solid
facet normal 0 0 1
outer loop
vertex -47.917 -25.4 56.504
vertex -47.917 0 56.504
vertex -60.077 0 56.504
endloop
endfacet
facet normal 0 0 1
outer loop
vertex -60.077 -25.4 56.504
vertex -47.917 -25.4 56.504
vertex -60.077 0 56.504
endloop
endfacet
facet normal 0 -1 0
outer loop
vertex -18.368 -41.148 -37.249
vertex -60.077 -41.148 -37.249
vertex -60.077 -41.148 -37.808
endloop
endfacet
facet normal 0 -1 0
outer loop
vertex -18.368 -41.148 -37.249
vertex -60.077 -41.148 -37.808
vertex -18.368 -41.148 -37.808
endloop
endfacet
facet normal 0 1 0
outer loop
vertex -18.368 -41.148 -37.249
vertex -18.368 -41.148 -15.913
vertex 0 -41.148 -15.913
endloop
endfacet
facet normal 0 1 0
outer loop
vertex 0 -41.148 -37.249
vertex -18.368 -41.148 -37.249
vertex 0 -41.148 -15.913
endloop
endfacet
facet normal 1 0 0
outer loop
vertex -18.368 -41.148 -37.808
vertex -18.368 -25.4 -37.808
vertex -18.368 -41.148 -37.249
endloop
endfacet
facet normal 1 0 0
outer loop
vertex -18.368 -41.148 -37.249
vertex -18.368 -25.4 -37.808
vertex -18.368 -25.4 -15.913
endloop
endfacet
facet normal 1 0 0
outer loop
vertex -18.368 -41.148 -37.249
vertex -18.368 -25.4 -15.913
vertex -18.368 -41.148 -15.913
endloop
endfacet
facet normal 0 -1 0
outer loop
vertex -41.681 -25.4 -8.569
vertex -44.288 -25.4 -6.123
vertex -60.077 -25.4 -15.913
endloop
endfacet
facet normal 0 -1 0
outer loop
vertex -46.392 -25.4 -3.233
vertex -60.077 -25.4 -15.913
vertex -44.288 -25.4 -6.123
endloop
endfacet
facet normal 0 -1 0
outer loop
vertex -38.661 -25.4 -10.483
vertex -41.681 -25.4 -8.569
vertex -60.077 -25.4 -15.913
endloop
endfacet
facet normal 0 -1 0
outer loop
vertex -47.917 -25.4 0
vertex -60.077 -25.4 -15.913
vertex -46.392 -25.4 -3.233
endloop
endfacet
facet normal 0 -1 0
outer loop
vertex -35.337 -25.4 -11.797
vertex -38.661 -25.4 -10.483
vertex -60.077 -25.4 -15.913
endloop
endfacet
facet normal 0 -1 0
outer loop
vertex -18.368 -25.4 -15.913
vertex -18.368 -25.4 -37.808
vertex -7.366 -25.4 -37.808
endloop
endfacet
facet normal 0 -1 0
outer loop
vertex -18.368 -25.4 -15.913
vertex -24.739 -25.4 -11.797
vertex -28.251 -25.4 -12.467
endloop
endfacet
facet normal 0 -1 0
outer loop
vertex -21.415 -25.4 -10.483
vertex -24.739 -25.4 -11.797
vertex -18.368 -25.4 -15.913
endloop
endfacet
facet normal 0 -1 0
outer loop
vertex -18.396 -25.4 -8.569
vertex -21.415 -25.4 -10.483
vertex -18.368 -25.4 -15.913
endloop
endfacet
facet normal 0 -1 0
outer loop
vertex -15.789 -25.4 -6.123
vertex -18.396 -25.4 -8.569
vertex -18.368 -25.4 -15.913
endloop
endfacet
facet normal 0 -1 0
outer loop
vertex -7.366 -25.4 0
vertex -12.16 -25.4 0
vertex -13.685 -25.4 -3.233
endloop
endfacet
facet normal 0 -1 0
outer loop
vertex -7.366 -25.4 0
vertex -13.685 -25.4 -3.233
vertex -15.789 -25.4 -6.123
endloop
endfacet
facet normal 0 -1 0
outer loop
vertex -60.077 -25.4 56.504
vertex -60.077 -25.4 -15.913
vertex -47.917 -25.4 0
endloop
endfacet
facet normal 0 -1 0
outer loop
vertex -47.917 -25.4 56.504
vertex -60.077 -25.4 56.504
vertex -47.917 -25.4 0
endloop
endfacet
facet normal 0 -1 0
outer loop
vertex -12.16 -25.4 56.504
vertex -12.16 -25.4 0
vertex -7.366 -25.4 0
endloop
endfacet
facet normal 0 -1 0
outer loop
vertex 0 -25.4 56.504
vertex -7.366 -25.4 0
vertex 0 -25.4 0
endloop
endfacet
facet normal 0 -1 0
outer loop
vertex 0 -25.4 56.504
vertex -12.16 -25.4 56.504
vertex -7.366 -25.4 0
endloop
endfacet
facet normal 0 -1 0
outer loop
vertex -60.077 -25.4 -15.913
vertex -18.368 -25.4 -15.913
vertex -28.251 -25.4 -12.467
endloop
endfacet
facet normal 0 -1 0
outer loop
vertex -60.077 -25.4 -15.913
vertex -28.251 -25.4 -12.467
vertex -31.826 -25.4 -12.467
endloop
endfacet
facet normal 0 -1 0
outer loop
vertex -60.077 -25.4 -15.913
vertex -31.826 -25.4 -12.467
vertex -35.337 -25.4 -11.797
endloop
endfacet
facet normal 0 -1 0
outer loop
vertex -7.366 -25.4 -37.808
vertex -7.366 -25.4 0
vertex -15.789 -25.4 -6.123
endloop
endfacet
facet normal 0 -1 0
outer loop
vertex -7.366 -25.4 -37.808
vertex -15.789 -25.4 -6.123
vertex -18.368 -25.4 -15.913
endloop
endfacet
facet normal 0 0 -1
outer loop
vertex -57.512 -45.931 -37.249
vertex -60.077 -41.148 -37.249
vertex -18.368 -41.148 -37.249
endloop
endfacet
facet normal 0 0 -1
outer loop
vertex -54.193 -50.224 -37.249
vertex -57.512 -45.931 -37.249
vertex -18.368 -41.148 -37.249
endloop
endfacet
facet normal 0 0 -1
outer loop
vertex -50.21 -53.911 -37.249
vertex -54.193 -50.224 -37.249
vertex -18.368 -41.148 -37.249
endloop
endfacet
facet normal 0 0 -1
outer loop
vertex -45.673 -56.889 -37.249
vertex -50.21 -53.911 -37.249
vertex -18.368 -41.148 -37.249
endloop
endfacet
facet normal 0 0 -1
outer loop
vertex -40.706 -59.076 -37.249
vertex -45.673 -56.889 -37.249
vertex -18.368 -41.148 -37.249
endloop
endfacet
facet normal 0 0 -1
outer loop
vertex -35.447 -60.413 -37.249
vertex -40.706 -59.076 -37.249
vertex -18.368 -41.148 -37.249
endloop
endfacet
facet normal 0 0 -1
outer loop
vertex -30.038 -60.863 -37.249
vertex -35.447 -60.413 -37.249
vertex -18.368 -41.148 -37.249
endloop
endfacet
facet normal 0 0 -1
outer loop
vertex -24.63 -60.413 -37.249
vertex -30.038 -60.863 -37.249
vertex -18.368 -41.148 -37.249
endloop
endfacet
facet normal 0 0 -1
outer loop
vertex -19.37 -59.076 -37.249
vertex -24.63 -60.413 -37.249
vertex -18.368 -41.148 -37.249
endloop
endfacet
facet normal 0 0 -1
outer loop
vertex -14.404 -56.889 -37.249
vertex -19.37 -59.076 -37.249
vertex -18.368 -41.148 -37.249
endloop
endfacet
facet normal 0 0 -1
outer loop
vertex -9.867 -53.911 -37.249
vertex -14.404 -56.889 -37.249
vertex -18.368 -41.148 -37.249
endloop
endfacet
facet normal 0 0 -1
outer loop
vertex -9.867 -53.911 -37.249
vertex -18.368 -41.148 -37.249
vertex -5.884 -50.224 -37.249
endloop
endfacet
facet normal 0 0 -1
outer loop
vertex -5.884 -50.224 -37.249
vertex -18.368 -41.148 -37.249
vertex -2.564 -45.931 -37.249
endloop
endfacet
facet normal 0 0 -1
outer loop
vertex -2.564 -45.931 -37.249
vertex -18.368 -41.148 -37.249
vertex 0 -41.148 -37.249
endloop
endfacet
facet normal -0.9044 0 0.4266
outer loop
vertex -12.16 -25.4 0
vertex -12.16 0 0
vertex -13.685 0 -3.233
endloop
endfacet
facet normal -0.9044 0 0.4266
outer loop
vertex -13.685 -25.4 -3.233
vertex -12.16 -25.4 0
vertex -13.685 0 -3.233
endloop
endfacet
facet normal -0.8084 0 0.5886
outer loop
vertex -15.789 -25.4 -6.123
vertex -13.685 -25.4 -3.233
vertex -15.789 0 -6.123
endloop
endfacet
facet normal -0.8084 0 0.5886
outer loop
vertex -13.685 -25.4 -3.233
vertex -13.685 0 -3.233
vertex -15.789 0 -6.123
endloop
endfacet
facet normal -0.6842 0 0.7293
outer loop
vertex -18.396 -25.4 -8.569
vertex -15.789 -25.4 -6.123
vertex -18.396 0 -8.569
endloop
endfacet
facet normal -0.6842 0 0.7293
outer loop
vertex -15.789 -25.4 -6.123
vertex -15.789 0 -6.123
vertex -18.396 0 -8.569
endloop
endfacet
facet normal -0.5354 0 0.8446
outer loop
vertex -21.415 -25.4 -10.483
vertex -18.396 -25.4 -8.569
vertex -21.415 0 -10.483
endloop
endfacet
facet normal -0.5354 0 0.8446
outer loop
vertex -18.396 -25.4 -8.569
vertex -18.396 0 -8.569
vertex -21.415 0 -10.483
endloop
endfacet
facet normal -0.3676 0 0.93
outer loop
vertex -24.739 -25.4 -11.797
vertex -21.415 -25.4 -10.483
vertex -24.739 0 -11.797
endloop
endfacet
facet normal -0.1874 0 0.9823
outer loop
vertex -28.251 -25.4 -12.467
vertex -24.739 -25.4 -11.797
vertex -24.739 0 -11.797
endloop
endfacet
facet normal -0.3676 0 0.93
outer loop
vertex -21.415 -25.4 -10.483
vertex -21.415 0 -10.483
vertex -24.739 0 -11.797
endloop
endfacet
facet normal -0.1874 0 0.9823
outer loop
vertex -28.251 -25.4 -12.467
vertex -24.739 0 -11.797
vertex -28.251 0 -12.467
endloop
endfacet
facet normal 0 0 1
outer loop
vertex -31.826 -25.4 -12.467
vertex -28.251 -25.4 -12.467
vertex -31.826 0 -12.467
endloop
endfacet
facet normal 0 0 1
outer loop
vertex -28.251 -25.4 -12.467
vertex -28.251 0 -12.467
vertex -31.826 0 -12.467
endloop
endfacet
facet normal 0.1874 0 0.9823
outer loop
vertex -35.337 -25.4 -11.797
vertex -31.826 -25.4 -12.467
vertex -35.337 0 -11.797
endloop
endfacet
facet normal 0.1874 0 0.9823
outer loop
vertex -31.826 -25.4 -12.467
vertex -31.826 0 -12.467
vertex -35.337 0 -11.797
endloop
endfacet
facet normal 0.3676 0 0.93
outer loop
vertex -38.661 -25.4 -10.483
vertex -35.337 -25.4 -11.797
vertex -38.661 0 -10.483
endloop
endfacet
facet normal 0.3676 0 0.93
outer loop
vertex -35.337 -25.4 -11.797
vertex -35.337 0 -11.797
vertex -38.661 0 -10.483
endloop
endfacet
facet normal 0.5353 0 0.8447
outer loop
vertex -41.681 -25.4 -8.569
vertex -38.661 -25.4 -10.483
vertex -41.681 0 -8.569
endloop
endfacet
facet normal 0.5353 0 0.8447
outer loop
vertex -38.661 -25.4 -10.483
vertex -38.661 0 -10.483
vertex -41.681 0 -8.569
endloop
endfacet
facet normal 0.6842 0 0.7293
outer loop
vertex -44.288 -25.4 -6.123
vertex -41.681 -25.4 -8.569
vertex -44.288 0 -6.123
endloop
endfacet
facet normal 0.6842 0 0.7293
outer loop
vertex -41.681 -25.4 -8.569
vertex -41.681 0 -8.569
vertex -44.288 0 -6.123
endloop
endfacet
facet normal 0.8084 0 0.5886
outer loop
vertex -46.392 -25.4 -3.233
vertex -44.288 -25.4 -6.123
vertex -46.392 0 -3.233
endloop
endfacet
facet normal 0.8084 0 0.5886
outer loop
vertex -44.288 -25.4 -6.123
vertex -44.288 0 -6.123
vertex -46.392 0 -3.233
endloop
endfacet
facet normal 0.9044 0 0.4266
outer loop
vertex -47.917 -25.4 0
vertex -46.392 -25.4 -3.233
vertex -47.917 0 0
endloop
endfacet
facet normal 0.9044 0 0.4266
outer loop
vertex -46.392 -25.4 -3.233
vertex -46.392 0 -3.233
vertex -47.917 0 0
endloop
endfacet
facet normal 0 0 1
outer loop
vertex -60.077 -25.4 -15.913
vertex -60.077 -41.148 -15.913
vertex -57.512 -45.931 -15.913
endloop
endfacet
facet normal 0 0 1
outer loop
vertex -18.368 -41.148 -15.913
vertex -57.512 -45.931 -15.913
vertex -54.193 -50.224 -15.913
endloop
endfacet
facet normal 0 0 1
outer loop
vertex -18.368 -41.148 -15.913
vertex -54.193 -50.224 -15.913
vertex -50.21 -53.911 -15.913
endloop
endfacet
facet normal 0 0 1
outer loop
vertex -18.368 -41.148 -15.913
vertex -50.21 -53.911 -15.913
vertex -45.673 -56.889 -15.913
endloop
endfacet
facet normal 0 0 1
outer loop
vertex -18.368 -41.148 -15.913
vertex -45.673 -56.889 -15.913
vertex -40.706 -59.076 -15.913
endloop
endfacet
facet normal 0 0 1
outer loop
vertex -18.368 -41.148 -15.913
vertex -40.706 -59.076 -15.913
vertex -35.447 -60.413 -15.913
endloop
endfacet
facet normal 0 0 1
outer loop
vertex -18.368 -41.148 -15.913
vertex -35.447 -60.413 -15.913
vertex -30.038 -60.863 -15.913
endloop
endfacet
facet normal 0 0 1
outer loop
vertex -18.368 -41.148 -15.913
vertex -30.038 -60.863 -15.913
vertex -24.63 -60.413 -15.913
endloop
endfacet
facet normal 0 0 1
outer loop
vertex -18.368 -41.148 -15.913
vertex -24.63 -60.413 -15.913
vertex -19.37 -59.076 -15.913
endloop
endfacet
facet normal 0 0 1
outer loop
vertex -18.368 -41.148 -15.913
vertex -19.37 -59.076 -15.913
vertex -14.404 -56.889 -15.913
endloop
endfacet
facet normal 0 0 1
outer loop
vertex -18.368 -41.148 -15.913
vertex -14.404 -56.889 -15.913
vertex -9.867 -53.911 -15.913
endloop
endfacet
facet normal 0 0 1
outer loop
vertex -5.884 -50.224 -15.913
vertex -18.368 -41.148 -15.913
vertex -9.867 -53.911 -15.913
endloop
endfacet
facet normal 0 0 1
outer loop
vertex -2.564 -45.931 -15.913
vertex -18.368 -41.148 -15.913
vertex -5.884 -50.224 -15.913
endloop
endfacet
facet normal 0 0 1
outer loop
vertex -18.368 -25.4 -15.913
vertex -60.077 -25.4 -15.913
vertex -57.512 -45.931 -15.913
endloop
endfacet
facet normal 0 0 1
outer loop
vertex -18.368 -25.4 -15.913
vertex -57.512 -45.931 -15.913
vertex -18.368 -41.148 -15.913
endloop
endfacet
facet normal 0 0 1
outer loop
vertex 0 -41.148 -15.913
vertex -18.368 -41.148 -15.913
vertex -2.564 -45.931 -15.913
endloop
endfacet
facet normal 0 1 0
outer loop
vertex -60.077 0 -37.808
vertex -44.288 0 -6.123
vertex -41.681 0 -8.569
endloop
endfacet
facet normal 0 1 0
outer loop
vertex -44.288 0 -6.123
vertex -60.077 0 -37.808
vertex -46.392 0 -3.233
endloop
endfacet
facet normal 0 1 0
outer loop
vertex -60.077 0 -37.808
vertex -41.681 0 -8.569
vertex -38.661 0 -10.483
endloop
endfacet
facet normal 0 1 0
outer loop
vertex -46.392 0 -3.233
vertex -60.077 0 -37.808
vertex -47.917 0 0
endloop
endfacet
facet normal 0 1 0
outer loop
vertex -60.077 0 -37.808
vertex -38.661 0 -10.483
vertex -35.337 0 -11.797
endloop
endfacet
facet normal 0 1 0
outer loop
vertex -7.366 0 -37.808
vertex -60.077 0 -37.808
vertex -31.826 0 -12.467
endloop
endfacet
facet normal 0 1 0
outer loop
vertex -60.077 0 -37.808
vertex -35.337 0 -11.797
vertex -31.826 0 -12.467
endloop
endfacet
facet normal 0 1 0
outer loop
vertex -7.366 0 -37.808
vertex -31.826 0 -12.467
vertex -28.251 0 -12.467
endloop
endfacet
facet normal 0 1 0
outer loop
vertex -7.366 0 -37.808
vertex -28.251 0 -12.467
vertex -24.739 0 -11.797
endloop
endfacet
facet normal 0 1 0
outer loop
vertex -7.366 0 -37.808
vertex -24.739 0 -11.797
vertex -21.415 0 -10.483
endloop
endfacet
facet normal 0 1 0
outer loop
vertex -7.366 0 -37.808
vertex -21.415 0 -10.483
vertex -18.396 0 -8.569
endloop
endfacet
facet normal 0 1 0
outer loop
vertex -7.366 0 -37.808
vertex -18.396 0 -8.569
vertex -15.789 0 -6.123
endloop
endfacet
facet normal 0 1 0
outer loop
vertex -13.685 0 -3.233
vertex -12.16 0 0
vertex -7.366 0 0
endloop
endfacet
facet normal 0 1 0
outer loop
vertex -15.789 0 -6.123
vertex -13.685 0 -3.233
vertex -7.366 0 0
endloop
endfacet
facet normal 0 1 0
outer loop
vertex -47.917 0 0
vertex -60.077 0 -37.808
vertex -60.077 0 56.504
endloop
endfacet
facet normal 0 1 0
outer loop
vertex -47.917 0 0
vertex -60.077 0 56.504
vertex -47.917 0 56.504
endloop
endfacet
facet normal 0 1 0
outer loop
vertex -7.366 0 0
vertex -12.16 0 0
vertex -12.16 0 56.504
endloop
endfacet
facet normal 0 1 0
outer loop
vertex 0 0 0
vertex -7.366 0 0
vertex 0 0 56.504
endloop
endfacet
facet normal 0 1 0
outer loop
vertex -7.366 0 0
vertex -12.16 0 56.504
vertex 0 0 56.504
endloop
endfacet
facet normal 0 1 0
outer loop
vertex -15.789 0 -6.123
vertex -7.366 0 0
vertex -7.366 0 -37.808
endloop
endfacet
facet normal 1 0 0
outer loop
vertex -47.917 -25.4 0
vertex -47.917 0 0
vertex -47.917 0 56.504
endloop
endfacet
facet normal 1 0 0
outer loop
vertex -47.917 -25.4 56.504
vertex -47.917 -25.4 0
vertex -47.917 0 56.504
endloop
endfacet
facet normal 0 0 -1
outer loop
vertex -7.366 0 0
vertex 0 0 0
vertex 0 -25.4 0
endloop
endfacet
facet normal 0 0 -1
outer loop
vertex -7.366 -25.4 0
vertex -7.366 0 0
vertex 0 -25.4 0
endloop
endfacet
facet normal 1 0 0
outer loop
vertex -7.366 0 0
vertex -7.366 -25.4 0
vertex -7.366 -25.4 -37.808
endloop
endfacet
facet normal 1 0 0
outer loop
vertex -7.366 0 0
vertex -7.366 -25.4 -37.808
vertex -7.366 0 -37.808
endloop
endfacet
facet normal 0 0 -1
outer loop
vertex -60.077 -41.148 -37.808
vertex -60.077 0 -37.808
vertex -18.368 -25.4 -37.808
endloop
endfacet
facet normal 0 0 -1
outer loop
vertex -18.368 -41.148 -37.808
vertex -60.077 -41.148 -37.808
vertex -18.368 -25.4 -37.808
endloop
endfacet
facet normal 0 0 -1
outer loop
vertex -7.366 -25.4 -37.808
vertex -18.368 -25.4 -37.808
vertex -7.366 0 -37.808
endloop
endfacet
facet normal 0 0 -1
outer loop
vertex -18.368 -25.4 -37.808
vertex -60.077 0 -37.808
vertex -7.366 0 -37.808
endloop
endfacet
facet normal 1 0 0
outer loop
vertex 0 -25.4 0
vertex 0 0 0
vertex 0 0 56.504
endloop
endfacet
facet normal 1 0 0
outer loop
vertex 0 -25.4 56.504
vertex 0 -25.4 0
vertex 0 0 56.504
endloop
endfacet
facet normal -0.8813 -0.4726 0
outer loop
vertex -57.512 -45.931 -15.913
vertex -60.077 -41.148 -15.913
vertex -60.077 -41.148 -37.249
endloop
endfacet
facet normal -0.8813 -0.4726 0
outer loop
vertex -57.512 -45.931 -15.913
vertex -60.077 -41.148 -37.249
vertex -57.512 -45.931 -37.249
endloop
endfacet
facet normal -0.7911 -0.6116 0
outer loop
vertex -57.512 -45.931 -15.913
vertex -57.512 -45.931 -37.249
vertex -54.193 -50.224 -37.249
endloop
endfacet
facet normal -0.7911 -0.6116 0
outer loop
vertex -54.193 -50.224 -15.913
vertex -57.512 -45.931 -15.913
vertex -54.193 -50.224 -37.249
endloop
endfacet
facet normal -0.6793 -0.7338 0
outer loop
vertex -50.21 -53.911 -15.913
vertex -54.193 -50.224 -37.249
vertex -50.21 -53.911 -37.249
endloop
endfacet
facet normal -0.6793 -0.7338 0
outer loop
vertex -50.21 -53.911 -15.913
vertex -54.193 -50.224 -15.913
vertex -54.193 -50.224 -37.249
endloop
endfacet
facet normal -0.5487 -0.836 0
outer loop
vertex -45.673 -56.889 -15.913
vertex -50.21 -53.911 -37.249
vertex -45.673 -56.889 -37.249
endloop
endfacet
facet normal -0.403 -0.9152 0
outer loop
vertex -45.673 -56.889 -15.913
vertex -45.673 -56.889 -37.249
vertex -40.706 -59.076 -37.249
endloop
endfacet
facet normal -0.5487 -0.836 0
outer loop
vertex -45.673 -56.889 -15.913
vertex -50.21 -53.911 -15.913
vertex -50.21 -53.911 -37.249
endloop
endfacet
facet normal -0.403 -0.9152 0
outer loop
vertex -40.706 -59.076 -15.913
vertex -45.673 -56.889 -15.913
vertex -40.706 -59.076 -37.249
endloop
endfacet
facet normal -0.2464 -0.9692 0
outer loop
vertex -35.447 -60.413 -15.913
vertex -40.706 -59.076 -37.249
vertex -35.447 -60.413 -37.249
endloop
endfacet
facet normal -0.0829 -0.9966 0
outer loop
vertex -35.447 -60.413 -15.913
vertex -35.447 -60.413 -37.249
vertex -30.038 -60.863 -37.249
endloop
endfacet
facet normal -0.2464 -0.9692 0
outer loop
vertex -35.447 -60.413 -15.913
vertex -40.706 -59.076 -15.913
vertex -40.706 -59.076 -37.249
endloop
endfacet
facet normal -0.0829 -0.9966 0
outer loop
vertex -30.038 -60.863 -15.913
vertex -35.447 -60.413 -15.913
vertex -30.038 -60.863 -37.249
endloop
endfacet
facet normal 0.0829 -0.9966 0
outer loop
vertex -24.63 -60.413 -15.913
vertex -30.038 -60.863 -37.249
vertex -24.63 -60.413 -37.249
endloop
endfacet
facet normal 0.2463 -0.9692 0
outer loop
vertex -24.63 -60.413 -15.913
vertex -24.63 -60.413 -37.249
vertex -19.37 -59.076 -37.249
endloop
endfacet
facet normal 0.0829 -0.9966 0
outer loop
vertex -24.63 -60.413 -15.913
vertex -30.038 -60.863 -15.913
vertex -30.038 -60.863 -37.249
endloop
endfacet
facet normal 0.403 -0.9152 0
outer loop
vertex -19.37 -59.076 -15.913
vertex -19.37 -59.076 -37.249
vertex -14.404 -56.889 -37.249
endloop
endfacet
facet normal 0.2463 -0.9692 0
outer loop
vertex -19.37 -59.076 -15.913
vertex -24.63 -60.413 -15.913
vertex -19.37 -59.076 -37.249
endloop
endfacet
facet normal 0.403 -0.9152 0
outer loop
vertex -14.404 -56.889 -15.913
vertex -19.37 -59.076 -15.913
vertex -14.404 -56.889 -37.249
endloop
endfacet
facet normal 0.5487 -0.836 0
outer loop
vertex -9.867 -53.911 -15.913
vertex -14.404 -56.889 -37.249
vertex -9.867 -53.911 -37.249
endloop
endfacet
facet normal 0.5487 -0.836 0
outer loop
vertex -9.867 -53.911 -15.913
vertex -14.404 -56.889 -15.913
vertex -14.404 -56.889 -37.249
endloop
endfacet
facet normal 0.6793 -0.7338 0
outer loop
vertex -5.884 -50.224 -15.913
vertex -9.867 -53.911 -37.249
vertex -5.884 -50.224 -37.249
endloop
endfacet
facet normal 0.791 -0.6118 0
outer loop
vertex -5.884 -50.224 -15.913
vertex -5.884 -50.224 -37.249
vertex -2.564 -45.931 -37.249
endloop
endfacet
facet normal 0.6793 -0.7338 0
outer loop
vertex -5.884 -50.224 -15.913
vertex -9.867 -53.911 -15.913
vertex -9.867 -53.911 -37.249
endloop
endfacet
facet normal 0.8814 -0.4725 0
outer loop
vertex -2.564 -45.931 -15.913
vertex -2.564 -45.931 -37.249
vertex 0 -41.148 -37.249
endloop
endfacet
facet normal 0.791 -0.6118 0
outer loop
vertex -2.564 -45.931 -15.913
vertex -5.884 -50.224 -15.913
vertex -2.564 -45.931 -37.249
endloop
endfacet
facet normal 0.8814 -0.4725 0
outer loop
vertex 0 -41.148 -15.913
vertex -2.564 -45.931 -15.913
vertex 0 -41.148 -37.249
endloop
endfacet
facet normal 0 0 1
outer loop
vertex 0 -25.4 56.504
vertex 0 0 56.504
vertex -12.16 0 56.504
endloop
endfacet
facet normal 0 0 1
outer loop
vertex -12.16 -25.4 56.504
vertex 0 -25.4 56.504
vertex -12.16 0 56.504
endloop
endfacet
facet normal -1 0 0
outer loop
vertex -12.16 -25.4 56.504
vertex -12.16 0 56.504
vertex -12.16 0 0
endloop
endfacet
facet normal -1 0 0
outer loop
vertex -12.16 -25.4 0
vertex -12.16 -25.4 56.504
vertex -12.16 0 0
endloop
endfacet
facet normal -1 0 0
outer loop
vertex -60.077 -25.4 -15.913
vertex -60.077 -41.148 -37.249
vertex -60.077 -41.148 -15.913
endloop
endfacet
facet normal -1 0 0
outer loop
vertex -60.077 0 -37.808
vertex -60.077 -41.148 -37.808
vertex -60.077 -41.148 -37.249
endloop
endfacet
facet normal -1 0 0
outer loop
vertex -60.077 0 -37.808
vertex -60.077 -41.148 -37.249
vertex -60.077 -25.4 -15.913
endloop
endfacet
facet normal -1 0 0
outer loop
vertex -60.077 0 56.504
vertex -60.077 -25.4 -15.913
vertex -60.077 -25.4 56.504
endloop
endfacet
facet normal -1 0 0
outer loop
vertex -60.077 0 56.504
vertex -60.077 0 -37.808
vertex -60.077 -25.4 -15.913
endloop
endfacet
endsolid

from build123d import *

# Parameters (mm, degrees)
F1_DEPTH = 25.4
F0_W     = 60.0766055286
F0_H     = 21.8948144466
F2_DEPTH = 41.148
F4_DEPTH = 21.336
F6_DEPTH = 7.366
F8_DEPTH = 21.8958144466


with BuildPart() as f1:
    # F0 (on Front) → F1 (new body)
    with BuildSketch(Plane.XZ):
        with BuildLine():
            Line((-47.9169413447, 56.5039552748), (-60.0766055286, 56.5039552748))
            Line((-60.0766055286, 56.5039552748), (-60.0766055286, -15.9127693623))
            Line((-60.0766055286, -15.9127693623), (0, -15.9127693623))
            Line((0, -15.9127693623), (0, 56.5039552748))
            Line((0, 56.5039552748), (-12.1596641839, 56.5039552748))
            Line((-12.1596641839, 56.5039552748), (-12.1596641839, 0))
            ThreePointArc((-12.1596641839, 0), (-30.0383027643, -12.5509662024), (-47.9169413447, 0))
            Line((-47.9169413447, 0), (-47.9169413447, 56.5039552748))
        make_face()
    extrude(amount=F1_DEPTH)

    # F0 (on Front) → F2 (join)
    with BuildSketch(Plane.XZ):
        with Locations((-30.0383027643, -26.8601765856)):
            Rectangle(F0_W, F0_H)
    extrude(amount=F2_DEPTH)

    # F3 (on face) → F4 (join)
    with BuildSketch(Plane.XY.offset(-15.9127693623)):
        with BuildLine():
            Line((0, -41.148), (-60.0766055286, -41.148))
            ThreePointArc((-60.0766055286, -41.148), (-30.0383027643, -60.8627597927), (0, -41.148))
        make_face()
    extrude(amount=-F4_DEPTH)

    # F5 (on face) → F6 (cut)
    with BuildSketch(Plane.YZ):
        Polygon((0, 0), (-25.4, 0), (-25.4, -15.9127693623), (-25.4, -37.8075838089), (0, -37.8075838089), align=None)
    extrude(amount=-F6_DEPTH, mode=Mode.SUBTRACT)

    # F7 (on face) → F8 (cut, through all)
    with BuildSketch(Plane.XY.offset(-15.9127693623)):
        Polygon((-7.366, -25.4), (-18.3683019131, -25.4), (-18.3683019131, -41.148), (0, -41.148), (0, -25.4), align=None)
    extrude(amount=-F8_DEPTH, mode=Mode.SUBTRACT)


solid = f1.part
